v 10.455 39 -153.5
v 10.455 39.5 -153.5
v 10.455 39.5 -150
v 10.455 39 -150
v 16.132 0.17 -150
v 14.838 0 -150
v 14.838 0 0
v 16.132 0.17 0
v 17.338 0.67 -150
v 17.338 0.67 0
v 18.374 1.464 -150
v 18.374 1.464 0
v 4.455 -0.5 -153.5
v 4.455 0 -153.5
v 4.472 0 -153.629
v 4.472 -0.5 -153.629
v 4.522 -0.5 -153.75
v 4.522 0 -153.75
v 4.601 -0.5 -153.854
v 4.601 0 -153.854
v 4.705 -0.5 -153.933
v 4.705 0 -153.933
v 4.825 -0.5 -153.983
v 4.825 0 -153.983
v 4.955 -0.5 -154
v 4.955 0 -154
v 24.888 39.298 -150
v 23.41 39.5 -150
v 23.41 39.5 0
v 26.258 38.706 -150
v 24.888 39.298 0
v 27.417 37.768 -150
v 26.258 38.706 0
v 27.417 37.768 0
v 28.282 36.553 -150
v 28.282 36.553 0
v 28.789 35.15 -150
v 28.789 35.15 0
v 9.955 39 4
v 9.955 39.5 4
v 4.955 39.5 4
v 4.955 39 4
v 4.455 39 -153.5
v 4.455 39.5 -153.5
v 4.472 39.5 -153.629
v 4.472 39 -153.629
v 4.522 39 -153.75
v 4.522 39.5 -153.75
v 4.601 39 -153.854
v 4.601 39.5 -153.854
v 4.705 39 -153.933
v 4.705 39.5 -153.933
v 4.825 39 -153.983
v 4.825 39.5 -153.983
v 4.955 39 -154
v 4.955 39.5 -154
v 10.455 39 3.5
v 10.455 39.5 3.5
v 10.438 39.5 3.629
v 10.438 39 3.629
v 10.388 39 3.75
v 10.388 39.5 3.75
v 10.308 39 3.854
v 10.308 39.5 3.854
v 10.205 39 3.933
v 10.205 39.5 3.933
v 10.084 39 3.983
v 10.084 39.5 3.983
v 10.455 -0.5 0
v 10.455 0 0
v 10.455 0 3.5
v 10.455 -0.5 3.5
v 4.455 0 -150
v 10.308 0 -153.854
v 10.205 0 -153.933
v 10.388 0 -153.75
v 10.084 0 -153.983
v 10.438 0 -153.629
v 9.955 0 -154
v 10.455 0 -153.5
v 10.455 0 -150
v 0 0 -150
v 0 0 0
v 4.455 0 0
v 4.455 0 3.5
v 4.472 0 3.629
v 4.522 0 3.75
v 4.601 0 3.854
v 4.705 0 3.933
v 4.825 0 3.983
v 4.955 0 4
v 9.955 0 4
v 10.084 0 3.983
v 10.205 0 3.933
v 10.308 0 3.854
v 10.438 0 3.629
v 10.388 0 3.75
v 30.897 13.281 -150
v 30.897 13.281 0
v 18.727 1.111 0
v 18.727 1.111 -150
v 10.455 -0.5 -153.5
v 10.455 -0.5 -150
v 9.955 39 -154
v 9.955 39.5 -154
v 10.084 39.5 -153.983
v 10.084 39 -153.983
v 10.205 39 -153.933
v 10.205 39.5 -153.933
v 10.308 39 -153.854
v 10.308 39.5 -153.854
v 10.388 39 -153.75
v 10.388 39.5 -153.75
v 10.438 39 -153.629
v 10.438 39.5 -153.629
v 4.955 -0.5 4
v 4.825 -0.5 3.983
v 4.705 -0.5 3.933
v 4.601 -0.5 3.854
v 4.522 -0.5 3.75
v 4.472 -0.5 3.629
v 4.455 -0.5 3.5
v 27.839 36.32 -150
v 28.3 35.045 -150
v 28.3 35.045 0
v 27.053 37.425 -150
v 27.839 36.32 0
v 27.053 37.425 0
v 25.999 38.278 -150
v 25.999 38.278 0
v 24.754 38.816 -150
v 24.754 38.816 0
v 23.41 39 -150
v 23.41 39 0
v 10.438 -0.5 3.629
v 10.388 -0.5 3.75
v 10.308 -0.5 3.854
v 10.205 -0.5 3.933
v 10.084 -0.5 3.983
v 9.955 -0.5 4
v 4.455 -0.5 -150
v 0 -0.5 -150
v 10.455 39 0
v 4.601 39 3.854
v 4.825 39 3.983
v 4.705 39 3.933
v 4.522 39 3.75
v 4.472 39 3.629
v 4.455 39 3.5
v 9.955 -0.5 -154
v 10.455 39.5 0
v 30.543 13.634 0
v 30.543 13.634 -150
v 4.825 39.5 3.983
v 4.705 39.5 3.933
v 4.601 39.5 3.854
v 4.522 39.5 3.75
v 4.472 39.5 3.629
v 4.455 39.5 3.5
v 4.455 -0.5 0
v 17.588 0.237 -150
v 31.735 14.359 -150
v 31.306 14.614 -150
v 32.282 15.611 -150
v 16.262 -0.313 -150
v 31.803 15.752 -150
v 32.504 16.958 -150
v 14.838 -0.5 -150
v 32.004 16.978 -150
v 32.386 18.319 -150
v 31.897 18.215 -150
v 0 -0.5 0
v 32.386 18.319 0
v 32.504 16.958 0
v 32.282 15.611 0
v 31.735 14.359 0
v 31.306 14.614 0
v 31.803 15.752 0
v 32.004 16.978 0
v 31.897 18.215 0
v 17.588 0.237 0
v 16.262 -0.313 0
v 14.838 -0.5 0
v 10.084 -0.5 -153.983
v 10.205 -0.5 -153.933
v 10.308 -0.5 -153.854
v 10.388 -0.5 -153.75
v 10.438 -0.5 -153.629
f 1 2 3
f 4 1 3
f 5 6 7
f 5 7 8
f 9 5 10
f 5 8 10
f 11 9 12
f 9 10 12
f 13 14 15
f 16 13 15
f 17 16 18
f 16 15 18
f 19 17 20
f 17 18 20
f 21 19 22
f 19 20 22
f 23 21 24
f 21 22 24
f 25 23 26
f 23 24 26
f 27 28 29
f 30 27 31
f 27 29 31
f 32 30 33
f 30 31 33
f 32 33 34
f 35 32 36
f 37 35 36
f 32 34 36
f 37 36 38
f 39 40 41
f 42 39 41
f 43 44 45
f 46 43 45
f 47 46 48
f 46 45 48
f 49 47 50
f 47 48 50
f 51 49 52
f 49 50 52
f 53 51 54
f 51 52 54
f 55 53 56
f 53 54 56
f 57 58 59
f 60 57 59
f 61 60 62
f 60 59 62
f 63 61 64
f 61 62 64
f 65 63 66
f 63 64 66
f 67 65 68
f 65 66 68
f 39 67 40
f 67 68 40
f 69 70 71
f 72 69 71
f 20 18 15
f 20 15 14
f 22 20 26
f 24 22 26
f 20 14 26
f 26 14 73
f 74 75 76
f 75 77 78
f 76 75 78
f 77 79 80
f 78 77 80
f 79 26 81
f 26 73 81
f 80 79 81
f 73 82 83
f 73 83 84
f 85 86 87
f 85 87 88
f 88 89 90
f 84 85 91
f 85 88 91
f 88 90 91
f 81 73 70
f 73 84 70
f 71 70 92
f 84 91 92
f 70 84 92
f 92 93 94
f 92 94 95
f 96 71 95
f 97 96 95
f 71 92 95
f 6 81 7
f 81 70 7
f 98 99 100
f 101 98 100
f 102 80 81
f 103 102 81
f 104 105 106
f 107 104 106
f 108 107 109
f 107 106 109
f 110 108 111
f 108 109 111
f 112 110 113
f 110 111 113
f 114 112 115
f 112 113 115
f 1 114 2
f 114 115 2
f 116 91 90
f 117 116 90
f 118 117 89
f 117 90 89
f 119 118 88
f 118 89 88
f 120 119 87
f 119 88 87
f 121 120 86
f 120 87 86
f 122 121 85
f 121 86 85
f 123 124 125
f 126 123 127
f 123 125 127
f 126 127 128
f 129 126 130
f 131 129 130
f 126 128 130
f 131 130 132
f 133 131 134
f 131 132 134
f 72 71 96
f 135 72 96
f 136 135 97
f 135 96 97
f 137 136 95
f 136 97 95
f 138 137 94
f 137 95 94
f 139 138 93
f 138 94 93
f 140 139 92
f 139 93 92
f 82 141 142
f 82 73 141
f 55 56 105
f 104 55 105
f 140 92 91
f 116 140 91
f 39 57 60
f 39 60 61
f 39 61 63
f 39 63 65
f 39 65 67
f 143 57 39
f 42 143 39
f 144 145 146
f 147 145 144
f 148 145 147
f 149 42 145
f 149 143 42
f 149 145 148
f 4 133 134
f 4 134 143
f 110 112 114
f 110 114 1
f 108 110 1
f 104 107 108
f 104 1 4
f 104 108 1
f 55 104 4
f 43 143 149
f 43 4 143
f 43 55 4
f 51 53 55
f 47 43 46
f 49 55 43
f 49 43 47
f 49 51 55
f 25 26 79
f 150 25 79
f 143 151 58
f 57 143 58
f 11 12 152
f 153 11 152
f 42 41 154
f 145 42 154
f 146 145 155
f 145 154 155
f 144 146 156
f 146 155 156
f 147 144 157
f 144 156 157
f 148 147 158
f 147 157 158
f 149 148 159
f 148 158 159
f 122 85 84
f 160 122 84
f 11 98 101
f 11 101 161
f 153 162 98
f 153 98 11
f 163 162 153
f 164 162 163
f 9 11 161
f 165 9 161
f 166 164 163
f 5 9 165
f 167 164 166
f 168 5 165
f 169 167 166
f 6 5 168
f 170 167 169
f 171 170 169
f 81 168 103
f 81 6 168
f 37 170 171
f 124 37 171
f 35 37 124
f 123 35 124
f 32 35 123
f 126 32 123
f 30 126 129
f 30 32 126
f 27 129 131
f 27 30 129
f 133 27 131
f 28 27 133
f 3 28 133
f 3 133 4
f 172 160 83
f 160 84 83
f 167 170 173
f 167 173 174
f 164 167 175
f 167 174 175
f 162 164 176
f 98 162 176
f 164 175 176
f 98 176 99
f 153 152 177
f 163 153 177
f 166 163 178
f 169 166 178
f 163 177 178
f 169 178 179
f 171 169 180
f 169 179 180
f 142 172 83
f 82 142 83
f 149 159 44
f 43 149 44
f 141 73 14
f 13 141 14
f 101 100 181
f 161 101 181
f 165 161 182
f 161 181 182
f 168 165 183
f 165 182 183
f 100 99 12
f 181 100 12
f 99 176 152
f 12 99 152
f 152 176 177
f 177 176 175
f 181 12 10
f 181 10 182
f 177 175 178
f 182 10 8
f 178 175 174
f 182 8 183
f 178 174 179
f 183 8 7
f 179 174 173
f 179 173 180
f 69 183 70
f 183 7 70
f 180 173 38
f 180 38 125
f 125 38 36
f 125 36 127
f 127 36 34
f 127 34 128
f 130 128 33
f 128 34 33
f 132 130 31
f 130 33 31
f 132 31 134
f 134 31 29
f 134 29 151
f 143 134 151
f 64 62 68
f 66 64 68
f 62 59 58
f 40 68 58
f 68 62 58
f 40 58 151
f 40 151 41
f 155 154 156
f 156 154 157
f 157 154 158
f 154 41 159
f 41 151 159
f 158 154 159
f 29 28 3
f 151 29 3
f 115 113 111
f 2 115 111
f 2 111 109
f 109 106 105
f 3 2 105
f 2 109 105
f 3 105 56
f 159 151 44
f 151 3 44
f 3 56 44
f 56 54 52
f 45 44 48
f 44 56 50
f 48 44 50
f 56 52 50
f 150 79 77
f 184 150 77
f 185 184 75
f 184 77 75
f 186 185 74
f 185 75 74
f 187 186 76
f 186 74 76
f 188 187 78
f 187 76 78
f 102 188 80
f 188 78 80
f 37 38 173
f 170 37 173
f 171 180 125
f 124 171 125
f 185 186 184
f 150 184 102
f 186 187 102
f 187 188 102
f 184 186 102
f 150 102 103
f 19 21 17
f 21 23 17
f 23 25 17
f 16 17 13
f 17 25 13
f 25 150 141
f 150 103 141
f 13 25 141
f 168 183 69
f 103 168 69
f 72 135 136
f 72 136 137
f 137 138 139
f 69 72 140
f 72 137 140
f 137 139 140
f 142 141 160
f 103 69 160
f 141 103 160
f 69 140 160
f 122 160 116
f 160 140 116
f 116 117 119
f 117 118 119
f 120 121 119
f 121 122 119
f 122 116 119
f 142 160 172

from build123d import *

# Parameters (mm, degrees)
BOSS_EXTRUDE1_DEPTH = 150
BOSS_EXTRUDE2_DEPTH = 0.5
BOSS_EXTRUDE3_START = -0.5
BOSS_EXTRUDE3_DEPTH = 0.5


with BuildPart() as part:
    # Sketch1 → Boss-Extrude1 (new body)
    with BuildSketch(Plane.XY):
        with BuildLine():
            Line((0, 0), (14.838134608, 0))
            ThreePointArc((14.838134608, 0), (16.75155177, 0.380602337), (18.373668514, 1.464466094))
            Line((18.373668514, 1.464466094), (30.543324162, 13.634121742))
            ThreePointArc((30.543324162, 13.634121742), (31.802691096, 15.752289806), (31.897349569, 18.214744029))
            Line((31.897349569, 18.214744029), (28.300052509, 35.045088382))
            ThreePointArc((28.300052509, 35.045088382), (26.554897598, 37.887508322), (23.410493196, 39))
            Line((23.410493196, 39), (4.454734574, 39))
            Line((4.454734574, 39), (4.454734574, 39.5))
            Line((4.454734574, 39.5), (23.410493196, 39.5))
            ThreePointArc((23.410493196, 39.5), (26.869338039, 38.276259154), (28.78900844, 35.14959722))
            Line((28.78900844, 35.14959722), (32.3863055, 18.319252867))
            ThreePointArc((32.3863055, 18.319252867), (32.282181181, 15.610553222), (30.896877552, 13.280568351))
            Line((30.896877552, 13.280568351), (18.727221905, 1.110912703))
            ThreePointArc((18.727221905, 1.110912703), (16.942893486, -0.081337429), (14.838134608, -0.5))
            Line((14.838134608, -0.5), (0, -0.5))
            Line((0, -0.5), (0, 0))
        make_face()
    extrude(amount=-BOSS_EXTRUDE1_DEPTH)

    # Sketch2 → Boss-Extrude2 (add)
    with BuildSketch(Plane(origin=(0, 39.5, 0), x_dir=(1, 0, 0), z_dir=(0, 1, 0))):
        with BuildLine():
            Line((4.454734574, 150), (4.454734574, 153.5))
            ThreePointArc((4.454734574, 153.5), (4.601181183, 153.853553391), (4.954734574, 154))
            Line((4.954734574, 154), (9.954734574, 154))
            ThreePointArc((9.954734574, 154), (10.308287964, 153.853553391), (10.454734574, 153.5))
            Line((10.454734574, 153.5), (10.454734574, 150))
            Line((10.454734574, 150), (4.454734574, 150))
        make_face()
        with BuildLine():
            Line((4.454734574, 0), (10.454734574, 0))
            Line((10.454734574, 0), (10.454734574, -3.5))
            ThreePointArc((10.454734574, -3.5), (10.308287964, -3.853553391), (9.954734574, -4))
            Line((9.954734574, -4), (4.954734574, -4))
            ThreePointArc((4.954734574, -4), (4.601181183, -3.853553391), (4.454734574, -3.5))
            Line((4.454734574, -3.5), (4.454734574, 0))
        make_face()
    extrude(amount=-BOSS_EXTRUDE2_DEPTH)

    # Sketch3 → Boss-Extrude3 (add)
    with BuildSketch(Plane.XZ.offset(0.5).offset(BOSS_EXTRUDE3_START)):
        with BuildLine():
            Line((10.454734574, -150), (4.454734574, -150))
            Line((4.454734574, -150), (4.454734574, -153.5))
            ThreePointArc((4.454734574, -153.5), (4.601181183, -153.853553391), (4.954734574, -154))
            Line((4.954734574, -154), (9.954734574, -154))
            ThreePointArc((9.954734574, -154), (10.308287964, -153.853553391), (10.454734574, -153.5))
            Line((10.454734574, -153.5), (10.454734574, -150))
        make_face()
        with BuildLine():
            Line((10.454734574, 0), (10.454734574, 3.5))
            ThreePointArc((10.454734574, 3.5), (10.308287964, 3.853553391), (9.954734574, 4))
            Line((9.954734574, 4), (4.954734574, 4))
            ThreePointArc((4.954734574, 4), (4.601181183, 3.853553391), (4.454734574, 3.5))
            Line((4.454734574, 3.5), (4.454734574, 0))
            Line((4.454734574, 0), (10.454734574, 0))
        make_face()
    extrude(amount=BOSS_EXTRUDE3_DEPTH)


solid = part.part
